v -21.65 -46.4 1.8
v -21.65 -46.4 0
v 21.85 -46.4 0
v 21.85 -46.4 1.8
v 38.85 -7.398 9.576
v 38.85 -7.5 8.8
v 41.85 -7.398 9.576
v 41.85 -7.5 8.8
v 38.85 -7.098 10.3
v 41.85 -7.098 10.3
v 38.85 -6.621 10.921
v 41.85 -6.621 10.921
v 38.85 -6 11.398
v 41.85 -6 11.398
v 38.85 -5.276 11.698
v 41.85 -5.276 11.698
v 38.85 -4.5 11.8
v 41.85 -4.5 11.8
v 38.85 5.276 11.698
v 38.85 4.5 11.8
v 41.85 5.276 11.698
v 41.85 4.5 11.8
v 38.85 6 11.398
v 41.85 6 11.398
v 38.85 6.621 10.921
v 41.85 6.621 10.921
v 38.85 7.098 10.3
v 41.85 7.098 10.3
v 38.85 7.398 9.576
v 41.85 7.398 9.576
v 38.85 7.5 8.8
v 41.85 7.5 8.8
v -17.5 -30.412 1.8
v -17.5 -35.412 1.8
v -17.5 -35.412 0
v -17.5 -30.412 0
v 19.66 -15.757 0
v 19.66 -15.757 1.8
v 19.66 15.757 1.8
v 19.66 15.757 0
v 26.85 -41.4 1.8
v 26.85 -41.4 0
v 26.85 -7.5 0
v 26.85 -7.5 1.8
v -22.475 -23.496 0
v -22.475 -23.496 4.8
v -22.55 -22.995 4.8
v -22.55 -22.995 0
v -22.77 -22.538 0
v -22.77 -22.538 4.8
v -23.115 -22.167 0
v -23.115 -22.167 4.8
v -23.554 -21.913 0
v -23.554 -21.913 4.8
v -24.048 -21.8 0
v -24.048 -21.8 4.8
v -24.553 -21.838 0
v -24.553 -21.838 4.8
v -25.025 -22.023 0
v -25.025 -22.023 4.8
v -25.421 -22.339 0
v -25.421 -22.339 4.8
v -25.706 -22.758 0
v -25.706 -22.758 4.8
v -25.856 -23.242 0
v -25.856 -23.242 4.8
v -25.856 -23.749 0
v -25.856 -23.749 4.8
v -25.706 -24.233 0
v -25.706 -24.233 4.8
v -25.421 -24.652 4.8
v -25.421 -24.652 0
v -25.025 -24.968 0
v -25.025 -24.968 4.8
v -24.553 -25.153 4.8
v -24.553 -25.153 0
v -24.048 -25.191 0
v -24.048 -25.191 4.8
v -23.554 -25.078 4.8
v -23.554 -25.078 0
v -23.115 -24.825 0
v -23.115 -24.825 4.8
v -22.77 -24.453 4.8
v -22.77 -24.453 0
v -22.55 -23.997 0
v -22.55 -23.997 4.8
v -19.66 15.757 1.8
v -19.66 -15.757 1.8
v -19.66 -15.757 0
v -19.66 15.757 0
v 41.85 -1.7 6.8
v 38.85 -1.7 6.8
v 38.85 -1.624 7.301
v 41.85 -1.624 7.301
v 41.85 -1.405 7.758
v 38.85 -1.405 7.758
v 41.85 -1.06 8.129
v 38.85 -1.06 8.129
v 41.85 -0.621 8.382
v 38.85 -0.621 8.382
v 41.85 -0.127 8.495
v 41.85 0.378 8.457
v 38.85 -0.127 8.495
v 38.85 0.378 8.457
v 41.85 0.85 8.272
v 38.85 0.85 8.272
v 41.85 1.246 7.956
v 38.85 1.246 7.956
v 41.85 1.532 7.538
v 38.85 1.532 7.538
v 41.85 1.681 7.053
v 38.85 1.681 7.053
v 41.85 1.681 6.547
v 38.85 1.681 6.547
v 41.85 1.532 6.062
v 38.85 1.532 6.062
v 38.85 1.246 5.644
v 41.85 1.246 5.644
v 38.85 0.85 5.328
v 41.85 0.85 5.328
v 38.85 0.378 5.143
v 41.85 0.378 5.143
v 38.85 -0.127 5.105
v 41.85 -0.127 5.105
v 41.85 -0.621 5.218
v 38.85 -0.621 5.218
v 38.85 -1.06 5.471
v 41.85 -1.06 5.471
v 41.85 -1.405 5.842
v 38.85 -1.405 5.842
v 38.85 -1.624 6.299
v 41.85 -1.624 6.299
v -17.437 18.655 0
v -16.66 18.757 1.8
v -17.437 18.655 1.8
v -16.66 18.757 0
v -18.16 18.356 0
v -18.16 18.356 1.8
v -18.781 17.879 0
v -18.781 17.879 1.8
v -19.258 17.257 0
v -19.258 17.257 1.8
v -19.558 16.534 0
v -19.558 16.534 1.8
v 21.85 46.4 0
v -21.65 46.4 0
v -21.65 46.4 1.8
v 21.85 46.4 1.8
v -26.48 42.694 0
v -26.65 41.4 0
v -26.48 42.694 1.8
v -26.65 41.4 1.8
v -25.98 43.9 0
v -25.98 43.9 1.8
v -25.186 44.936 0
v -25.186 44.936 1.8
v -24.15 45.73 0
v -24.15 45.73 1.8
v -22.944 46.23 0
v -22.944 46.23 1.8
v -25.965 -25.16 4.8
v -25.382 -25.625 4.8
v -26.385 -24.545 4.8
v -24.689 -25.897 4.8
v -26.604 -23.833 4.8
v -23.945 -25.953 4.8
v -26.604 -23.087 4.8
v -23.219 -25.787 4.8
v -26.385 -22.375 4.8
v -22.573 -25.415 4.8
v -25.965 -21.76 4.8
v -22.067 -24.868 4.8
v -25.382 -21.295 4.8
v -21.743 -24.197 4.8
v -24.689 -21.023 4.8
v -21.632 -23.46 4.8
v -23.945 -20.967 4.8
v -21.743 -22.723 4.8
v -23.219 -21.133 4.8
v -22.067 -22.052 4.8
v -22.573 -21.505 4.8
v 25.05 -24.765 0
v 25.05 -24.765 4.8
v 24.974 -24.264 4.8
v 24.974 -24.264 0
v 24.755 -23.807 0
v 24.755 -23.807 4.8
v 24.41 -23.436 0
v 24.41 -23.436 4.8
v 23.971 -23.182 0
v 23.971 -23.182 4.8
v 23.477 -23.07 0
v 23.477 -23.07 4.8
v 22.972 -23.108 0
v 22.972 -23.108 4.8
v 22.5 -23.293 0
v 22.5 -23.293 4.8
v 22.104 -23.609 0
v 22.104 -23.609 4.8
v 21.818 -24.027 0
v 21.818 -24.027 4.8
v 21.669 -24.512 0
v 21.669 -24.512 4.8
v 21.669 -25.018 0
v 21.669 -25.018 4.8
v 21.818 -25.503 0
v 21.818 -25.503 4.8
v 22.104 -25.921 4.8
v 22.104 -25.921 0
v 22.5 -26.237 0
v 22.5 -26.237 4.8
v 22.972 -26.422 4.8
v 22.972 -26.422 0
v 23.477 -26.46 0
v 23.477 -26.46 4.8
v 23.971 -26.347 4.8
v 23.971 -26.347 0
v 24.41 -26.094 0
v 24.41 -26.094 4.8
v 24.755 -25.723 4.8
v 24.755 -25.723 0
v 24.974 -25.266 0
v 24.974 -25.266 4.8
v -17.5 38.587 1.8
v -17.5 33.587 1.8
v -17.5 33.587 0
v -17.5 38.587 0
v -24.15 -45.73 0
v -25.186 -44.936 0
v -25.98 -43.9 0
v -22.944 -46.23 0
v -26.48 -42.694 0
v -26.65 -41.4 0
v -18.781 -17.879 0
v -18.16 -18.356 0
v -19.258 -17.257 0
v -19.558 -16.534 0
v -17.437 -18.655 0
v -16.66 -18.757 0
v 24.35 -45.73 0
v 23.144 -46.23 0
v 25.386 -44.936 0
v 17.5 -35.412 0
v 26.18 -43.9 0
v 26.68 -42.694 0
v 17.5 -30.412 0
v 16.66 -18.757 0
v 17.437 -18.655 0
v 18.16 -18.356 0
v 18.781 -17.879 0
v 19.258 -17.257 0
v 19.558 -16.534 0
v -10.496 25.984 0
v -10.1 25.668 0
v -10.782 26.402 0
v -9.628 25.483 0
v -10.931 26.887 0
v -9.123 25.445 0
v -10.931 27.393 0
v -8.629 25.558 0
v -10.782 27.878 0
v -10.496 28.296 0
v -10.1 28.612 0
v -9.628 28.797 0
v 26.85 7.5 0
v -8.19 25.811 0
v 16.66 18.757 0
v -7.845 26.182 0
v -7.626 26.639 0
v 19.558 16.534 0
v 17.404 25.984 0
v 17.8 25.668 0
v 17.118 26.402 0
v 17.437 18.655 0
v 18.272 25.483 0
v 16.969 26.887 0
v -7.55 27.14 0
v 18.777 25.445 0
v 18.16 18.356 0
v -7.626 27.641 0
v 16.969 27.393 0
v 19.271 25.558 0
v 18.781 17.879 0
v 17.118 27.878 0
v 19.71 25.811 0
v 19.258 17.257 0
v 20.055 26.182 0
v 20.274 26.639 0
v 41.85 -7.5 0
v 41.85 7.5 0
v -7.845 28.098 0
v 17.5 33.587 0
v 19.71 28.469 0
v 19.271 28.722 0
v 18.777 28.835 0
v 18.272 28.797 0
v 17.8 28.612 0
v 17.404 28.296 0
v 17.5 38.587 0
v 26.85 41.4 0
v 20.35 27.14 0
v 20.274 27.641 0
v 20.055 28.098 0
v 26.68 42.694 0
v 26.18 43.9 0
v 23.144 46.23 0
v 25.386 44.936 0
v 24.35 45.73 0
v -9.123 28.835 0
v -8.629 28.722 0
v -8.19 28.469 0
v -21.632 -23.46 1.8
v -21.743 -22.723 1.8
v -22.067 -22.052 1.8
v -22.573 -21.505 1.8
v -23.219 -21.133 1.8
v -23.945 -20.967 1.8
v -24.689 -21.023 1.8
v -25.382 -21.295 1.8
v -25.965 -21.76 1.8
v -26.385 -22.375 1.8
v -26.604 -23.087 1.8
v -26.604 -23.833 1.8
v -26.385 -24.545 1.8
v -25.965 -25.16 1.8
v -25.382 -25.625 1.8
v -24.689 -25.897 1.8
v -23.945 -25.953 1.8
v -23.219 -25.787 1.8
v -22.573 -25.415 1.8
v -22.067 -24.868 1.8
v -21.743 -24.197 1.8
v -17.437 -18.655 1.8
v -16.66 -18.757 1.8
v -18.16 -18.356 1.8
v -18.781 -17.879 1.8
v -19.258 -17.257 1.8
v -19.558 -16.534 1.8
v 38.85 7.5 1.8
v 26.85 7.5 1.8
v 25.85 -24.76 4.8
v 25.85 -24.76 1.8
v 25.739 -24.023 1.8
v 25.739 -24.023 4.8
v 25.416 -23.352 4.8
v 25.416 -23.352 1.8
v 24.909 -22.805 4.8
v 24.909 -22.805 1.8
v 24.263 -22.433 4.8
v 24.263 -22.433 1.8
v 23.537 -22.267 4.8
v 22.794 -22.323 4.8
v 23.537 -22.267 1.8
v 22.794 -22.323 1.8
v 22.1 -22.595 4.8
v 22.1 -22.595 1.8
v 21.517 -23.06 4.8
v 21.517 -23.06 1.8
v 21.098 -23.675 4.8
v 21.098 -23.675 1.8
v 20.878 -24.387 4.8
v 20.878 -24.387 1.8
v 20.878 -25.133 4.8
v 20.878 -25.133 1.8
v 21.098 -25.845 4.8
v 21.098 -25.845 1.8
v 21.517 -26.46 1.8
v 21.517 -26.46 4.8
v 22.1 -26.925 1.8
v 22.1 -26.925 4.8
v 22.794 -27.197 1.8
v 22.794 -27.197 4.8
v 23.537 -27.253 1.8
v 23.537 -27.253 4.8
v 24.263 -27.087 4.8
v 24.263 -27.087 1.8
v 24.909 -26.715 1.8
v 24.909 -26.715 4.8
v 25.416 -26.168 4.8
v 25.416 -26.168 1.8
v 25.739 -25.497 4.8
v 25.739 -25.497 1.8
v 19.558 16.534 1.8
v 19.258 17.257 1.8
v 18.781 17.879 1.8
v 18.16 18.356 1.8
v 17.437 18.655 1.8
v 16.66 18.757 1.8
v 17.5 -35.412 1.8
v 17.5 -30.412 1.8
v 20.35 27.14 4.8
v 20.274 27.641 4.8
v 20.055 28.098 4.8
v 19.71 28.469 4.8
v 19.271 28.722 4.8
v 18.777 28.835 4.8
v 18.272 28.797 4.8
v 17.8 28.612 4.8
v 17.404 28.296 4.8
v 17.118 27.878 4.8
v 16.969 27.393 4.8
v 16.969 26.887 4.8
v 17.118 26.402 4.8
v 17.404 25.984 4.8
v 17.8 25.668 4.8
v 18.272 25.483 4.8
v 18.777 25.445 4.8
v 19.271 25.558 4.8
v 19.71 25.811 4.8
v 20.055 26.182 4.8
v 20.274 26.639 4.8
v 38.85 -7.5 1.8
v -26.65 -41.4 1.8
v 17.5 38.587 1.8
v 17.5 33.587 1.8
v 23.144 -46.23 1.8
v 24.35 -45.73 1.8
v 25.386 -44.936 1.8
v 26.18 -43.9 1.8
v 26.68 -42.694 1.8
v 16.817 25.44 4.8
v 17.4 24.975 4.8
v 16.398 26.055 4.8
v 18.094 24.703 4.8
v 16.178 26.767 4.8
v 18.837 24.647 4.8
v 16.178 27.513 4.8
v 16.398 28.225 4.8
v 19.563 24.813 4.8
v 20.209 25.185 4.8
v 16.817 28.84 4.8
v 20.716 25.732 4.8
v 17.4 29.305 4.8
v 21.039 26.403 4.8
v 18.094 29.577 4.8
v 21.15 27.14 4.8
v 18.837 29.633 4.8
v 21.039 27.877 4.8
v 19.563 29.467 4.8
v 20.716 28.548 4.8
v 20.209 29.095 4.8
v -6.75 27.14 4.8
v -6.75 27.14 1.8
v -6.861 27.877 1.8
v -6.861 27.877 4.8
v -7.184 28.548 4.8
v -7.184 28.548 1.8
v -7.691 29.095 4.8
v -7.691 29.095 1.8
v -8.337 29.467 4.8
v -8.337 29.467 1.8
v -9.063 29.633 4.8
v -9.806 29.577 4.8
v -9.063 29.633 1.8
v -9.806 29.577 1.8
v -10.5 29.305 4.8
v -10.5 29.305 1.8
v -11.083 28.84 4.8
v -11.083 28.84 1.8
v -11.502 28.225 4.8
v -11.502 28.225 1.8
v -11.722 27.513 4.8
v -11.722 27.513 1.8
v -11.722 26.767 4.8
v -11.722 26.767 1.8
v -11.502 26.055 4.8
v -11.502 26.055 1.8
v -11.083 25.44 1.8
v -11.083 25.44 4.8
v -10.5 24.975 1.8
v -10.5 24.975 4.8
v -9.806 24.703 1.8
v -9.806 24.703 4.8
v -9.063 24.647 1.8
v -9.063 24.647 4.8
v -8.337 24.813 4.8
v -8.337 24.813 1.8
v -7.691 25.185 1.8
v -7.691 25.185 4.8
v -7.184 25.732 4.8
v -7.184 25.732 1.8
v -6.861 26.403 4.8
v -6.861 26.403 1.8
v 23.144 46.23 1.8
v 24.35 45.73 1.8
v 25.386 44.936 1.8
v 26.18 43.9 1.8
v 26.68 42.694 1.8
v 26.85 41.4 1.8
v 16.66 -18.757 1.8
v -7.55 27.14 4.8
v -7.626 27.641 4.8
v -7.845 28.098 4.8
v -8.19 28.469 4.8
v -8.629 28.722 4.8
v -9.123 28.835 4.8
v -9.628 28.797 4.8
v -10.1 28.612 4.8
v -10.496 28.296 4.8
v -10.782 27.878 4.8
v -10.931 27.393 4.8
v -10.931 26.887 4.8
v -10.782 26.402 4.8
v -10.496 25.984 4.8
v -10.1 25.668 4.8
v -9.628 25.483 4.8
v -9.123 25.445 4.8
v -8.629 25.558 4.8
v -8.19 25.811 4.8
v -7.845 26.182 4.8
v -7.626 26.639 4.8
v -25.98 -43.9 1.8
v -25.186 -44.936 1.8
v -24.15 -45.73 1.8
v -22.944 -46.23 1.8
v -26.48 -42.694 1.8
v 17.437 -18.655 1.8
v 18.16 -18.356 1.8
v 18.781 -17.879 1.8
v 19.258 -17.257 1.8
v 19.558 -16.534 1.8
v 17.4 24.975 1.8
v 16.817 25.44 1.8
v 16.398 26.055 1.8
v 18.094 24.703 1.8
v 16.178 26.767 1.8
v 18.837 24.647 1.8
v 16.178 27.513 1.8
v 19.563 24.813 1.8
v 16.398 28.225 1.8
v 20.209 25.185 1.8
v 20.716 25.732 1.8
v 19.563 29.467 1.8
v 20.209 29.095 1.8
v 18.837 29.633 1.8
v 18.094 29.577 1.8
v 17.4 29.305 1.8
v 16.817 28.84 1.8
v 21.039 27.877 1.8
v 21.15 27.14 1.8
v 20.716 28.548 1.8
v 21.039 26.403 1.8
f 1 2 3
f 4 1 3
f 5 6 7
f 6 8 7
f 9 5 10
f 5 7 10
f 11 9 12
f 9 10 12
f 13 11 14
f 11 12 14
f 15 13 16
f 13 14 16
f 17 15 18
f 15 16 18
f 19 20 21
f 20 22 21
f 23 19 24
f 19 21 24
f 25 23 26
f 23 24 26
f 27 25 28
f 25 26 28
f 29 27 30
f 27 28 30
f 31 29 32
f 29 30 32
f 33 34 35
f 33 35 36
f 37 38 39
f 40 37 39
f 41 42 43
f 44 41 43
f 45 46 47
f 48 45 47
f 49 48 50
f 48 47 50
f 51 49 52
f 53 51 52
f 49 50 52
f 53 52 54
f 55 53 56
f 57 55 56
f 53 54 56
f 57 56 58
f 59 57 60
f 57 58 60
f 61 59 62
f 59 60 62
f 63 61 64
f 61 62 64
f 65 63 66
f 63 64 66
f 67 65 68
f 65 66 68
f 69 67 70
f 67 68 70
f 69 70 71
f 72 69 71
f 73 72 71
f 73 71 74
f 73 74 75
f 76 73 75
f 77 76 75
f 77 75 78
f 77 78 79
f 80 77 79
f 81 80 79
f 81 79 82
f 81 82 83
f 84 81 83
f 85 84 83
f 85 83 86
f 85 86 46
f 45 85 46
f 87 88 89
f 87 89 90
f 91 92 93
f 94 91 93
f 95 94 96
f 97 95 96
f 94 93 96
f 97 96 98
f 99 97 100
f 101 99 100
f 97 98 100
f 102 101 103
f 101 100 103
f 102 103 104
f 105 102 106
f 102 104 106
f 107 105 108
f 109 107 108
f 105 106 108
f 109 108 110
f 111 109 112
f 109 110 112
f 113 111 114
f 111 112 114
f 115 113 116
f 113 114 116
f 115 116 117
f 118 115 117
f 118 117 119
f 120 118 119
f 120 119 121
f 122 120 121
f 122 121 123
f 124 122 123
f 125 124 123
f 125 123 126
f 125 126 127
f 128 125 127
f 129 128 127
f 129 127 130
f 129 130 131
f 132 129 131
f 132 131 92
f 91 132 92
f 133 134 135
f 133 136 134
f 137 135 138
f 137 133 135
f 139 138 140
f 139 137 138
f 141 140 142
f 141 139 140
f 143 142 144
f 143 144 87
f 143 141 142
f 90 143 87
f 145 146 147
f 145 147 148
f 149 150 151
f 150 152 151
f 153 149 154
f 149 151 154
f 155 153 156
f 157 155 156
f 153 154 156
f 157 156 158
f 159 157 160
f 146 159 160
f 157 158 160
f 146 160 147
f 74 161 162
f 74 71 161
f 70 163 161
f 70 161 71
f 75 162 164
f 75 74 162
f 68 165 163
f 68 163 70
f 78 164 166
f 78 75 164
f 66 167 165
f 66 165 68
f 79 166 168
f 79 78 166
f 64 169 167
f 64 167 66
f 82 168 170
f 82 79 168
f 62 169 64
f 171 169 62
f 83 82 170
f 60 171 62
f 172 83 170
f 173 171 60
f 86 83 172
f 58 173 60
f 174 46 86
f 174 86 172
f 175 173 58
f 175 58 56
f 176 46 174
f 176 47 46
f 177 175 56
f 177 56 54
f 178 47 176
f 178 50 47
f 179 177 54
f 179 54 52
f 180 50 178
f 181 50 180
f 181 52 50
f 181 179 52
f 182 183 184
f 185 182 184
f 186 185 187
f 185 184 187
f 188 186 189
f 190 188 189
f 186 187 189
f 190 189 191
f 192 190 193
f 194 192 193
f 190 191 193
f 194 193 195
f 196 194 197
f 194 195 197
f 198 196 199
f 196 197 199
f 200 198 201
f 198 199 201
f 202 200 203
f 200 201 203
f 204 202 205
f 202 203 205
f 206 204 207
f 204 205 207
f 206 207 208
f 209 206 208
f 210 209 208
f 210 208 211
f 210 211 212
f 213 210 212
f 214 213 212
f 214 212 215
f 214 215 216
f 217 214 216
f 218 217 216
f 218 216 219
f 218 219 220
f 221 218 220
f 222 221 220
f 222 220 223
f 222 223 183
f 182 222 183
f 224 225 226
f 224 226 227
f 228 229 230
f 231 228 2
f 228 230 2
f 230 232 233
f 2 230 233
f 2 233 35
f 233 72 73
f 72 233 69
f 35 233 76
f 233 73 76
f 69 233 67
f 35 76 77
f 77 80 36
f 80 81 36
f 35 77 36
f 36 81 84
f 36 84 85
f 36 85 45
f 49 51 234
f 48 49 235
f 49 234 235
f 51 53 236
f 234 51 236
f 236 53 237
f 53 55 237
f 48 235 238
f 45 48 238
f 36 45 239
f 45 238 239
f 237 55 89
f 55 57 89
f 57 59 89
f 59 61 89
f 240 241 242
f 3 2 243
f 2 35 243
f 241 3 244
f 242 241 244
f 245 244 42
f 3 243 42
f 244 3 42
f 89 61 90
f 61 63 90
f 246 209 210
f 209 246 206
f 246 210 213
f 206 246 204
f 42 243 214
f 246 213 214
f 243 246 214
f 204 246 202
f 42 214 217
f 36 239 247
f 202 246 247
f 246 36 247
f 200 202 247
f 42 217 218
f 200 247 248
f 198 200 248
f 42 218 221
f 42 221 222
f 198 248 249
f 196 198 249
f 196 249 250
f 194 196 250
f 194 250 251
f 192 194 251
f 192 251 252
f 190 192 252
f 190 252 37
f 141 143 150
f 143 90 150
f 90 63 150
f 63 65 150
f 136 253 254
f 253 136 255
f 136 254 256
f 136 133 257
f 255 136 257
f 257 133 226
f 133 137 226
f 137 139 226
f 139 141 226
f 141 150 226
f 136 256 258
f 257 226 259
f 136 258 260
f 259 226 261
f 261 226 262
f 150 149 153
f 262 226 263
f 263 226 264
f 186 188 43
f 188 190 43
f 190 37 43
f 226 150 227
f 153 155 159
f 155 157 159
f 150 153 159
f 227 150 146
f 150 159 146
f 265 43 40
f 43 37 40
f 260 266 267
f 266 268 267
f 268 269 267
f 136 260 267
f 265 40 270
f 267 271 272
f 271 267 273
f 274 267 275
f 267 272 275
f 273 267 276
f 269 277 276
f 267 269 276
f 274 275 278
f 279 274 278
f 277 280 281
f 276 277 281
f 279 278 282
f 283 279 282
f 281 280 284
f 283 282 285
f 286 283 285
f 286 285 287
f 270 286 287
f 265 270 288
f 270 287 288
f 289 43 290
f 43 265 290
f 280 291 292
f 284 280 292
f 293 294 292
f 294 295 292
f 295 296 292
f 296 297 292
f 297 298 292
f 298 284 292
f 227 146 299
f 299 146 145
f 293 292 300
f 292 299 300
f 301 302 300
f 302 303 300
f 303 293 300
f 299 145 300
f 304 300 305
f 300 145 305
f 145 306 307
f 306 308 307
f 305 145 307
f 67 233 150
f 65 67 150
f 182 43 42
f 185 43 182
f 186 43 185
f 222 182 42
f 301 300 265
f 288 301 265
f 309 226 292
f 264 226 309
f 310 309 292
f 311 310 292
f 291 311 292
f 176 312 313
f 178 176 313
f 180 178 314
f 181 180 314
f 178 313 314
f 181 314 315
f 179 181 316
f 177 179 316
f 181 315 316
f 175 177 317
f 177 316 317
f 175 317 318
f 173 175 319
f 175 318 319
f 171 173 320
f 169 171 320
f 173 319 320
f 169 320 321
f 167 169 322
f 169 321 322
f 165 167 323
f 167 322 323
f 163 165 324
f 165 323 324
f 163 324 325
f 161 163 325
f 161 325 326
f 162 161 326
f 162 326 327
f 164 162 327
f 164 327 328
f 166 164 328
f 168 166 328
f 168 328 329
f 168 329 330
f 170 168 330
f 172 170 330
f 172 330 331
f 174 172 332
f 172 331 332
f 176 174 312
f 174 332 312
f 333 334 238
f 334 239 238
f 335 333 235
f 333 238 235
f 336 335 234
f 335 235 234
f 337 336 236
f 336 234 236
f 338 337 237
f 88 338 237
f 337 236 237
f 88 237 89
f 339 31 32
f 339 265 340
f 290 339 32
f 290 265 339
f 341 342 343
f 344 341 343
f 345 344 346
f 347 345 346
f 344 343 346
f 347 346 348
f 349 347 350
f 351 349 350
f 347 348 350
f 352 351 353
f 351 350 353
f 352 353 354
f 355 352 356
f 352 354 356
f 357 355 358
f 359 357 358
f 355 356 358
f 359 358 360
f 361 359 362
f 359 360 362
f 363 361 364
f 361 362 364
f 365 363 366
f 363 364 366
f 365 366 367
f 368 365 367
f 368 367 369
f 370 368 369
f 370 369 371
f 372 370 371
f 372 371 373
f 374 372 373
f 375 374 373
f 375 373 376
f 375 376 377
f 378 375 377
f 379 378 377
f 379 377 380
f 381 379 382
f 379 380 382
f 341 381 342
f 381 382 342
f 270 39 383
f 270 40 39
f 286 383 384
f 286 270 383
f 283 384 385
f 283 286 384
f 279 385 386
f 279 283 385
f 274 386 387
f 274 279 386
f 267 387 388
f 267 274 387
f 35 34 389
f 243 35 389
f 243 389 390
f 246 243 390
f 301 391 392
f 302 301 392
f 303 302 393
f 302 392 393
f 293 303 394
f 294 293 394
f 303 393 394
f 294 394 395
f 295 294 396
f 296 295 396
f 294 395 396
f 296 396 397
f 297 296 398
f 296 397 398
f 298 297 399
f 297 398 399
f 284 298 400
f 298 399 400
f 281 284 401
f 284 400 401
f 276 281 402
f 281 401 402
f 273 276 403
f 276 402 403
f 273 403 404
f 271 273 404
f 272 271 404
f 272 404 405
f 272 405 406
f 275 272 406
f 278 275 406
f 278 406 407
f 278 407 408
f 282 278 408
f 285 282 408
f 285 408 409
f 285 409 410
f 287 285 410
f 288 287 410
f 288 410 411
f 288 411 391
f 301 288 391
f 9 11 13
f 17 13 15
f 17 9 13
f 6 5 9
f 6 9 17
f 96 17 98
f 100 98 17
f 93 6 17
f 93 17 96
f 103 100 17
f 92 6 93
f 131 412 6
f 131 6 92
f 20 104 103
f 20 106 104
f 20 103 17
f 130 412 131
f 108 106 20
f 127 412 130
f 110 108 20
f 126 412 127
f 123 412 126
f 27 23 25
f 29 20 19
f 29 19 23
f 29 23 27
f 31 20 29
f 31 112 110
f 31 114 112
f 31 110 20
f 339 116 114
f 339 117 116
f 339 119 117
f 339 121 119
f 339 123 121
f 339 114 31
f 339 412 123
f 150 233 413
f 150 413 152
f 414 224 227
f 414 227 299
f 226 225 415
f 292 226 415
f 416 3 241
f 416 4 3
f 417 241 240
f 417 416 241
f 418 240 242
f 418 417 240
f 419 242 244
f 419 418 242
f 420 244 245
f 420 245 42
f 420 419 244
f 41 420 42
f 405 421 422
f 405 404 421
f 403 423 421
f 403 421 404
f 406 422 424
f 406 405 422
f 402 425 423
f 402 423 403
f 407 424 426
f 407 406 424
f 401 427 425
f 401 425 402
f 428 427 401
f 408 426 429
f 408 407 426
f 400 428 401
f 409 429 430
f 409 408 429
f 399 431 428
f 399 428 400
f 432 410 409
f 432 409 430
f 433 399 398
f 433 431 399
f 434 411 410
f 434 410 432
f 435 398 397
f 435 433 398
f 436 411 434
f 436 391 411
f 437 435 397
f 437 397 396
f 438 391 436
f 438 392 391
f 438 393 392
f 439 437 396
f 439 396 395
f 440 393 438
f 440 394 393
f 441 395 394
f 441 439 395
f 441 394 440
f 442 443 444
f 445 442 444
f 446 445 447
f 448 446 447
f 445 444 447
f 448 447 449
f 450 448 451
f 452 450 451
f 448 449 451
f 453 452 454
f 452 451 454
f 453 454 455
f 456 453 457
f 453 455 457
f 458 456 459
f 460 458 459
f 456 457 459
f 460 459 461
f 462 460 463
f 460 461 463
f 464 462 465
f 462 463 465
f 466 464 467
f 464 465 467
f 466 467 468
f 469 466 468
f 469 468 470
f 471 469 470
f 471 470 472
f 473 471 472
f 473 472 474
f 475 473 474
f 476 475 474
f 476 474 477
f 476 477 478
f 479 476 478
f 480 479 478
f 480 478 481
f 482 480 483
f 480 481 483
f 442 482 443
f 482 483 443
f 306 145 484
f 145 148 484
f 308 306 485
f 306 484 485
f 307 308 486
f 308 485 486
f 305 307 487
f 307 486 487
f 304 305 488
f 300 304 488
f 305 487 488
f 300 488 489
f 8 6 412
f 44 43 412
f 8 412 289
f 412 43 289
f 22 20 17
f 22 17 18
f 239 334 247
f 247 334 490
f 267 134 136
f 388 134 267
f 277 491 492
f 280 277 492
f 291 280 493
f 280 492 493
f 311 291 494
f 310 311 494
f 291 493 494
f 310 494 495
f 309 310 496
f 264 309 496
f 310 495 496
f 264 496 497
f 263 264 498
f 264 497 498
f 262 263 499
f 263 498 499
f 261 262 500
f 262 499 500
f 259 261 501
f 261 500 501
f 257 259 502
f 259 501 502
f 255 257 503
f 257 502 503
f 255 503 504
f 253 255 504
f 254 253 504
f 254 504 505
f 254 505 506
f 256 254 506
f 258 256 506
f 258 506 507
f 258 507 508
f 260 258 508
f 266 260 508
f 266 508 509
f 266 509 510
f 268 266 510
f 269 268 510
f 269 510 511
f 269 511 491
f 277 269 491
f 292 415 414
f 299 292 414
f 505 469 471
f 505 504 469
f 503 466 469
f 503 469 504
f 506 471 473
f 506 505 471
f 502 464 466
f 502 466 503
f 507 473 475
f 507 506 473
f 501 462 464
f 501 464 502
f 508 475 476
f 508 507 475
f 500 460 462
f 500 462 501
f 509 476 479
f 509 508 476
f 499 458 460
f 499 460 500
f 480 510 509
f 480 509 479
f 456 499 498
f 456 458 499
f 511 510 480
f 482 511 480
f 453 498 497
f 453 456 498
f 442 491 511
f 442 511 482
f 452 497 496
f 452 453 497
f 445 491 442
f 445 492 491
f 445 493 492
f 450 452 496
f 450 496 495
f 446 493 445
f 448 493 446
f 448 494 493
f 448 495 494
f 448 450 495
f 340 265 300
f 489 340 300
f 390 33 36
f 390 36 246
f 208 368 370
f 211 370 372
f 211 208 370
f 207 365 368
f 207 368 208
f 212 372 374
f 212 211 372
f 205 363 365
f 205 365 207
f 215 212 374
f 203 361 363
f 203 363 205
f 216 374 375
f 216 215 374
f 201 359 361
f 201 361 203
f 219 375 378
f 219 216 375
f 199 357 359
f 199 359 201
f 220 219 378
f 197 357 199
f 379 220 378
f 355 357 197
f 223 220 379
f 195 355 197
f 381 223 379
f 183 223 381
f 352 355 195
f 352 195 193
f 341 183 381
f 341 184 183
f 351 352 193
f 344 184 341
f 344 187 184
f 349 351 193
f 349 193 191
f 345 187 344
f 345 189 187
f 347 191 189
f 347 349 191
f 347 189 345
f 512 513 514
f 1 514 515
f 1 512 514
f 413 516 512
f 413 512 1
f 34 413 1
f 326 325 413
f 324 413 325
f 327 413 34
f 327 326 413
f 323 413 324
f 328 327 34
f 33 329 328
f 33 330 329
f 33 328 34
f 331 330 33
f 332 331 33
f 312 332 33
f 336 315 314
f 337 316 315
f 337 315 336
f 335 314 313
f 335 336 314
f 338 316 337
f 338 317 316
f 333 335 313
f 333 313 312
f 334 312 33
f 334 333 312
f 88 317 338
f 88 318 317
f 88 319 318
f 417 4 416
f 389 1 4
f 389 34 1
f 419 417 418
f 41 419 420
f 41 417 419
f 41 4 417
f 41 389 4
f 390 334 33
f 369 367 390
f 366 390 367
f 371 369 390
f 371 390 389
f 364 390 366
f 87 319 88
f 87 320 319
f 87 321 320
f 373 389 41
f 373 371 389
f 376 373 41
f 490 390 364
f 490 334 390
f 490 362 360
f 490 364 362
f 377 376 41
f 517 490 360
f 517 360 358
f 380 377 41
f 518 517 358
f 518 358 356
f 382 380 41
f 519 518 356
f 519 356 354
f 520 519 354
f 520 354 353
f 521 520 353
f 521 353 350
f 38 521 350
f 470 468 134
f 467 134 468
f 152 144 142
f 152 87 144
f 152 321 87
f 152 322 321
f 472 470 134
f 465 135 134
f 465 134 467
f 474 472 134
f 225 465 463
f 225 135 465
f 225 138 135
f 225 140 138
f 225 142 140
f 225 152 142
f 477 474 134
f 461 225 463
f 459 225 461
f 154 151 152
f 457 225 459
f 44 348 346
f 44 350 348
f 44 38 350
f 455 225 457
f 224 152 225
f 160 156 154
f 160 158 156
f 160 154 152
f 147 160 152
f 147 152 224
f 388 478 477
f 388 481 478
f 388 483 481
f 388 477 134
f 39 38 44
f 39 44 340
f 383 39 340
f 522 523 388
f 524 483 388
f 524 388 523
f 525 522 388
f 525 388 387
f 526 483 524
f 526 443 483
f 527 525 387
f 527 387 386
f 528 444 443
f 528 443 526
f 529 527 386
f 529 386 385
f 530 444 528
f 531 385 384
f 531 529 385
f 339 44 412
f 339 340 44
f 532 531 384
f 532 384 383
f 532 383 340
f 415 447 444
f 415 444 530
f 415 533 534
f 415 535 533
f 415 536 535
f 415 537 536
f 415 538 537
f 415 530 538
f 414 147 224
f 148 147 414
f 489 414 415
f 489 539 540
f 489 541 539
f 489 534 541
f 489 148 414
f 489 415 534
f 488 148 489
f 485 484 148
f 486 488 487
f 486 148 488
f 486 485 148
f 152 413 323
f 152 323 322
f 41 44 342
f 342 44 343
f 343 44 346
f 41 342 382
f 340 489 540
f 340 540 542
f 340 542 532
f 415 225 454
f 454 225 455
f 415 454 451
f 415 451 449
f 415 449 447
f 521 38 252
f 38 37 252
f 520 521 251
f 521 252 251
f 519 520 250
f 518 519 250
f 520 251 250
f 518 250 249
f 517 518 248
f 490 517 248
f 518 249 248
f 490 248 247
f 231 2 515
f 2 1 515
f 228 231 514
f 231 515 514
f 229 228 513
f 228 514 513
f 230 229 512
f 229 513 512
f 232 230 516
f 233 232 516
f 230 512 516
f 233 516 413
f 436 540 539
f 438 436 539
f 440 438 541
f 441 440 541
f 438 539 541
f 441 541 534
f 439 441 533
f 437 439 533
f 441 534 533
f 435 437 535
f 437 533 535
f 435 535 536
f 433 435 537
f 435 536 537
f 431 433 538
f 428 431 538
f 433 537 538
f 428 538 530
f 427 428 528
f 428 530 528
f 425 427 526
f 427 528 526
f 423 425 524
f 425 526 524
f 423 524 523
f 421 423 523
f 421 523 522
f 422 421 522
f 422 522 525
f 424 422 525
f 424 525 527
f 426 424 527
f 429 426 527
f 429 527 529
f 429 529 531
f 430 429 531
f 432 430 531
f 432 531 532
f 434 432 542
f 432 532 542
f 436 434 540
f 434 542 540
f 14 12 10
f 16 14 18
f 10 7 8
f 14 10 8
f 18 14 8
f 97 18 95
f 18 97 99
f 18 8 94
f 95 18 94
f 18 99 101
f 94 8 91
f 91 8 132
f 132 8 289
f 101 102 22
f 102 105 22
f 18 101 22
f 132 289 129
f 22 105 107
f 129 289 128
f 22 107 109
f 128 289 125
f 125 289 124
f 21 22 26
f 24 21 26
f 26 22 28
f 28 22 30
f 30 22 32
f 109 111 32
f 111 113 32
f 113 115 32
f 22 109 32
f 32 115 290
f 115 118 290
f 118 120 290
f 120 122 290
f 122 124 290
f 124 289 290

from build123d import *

# Parameters (mm, degrees)
SKETCH_W        = 53.5
SKETCH_H        = 92.8
PAD_DEPTH       = 1.8
SKETCH001_R     = 2.5
PAD001_DEPTH    = 3
SKETCH002_R     = 1.7
POCKET_DEPTH    = 5
SKETCH003_W     = 15
SKETCH003_H     = 1.8
PAD002_DEPTH    = 15
SKETCH004_W     = 39.320262
SKETCH004_H     = 37.514924
POCKET001_DEPTH = 5
FILLET_R        = 5
FILLET001_R     = 5
SKETCH005_W     = 35
SKETCH005_H     = 5
POCKET002_DEPTH = 5
SKETCH006_W     = 3
SKETCH006_H     = 15
PAD003_DEPTH    = 10
SKETCH007_R     = 1.7
POCKET003_DEPTH = 5
FILLET002_R     = 5
FILLET003_R     = 5
FILLET004_R     = 3
FILLET005_R     = 3
FILLET006_R     = 3
FILLET007_R     = 3
FILLET008_R     = 3
FILLET009_R     = 3


with BuildPart() as part:
    # Sketch → Pad (new body)
    with BuildSketch(Plane.XY):
        with Locations((0.1, 0)):
            Rectangle(SKETCH_W, SKETCH_H)
    extrude(amount=PAD_DEPTH)

    # Sketch001 (on Face6 of Pad) → Pad001 (join)
    with BuildSketch(Plane.XY.offset(1.8)):
        with Locations((-9.25, 27.14)):
            Circle(SKETCH001_R)
        with Locations((18.65, 27.14)):
            Circle(SKETCH001_R)
        with Locations((-24.132207, -23.46)):
            Circle(SKETCH001_R)
        with Locations((23.35, -24.76)):
            Circle(SKETCH001_R)
    extrude(amount=PAD001_DEPTH)

    # Sketch002 (on Face12 of Pad001) → Pocket (cut)
    with BuildSketch(Plane.XY.offset(4.8)):
        with Locations((-24.174742, -23.495716)):
            Circle(SKETCH002_R)
        with Locations((-9.25, 27.14)):
            Circle(SKETCH002_R)
        with Locations((18.65, 27.14)):
            Circle(SKETCH002_R)
        with Locations((23.35, -24.764911)):
            Circle(SKETCH002_R)
    extrude(amount=-POCKET_DEPTH, mode=Mode.SUBTRACT)

    # Sketch003 (on Face3 of Pocket) → Pad002 (join)
    with BuildSketch(Plane.YZ.offset(26.85)):
        with Locations((0, 0.9)):
            Rectangle(SKETCH003_W, SKETCH003_H)
    extrude(amount=PAD002_DEPTH)

    # Sketch004 (on Face5 of Pad002) → Pocket001 (cut)
    with BuildSketch(Plane.XY.offset(1.8)):
        Rectangle(SKETCH004_W, SKETCH004_H)
    extrude(amount=-POCKET001_DEPTH, mode=Mode.SUBTRACT)

    # Fillet
    fillet_edges = [part.edges().sort_by_distance(p)[0] for p in [
        (-26.65, 46.4, 0.9),
    ]]
    fillet(fillet_edges, radius=FILLET_R)

    # Fillet001
    fillet001_edges = [part.edges().sort_by_distance(p)[0] for p in [
        (26.85, -46.4, 0.9),
    ]]
    fillet(fillet001_edges, radius=FILLET001_R)

    # Sketch005 → Pocket002 (cut)
    with BuildSketch(Plane.XY.offset(1.8)):
        with Locations((0, -32.91241)):
            Rectangle(SKETCH005_W, SKETCH005_H)
        with Locations((0, 36.086824)):
            Rectangle(SKETCH005_W, SKETCH005_H)
    extrude(amount=-POCKET002_DEPTH, mode=Mode.SUBTRACT)

    # Sketch006 (on Face18 of Pocket001) → Pad003 (join)
    with BuildSketch(Plane.XY.offset(1.8)):
        with Locations((40.35, 0)):
            Rectangle(SKETCH006_W, SKETCH006_H)
    extrude(amount=PAD003_DEPTH)

    # Sketch007 (on Face42 of Pad003) → Pocket003 (cut)
    with BuildSketch(Plane(origin=(38.85, 0, 0), x_dir=(0, -1, 0), z_dir=(-1, 0, 0))):
        with Locations((0, 6.8)):
            Circle(SKETCH007_R)
    extrude(amount=-POCKET003_DEPTH, mode=Mode.SUBTRACT)

    # Fillet002
    fillet002_edges = [part.edges().sort_by_distance(p)[0] for p in [
        (-26.65, -46.4, 0.9),
    ]]
    fillet(fillet002_edges, radius=FILLET002_R)

    # Fillet003
    fillet003_edges = [part.edges().sort_by_distance(p)[0] for p in [
        (26.85, 46.4, 0.9),
    ]]
    fillet(fillet003_edges, radius=FILLET003_R)

    # Fillet004
    fillet004_edges = [part.edges().sort_by_distance(p)[0] for p in [
        (40.35, -7.5, 11.8),
    ]]
    fillet(fillet004_edges, radius=FILLET004_R)

    # Fillet005
    fillet005_edges = [part.edges().sort_by_distance(p)[0] for p in [
        (40.35, 7.5, 11.8),
    ]]
    fillet(fillet005_edges, radius=FILLET005_R)

    # Fillet006
    fillet006_edges = [part.edges().sort_by_distance(p)[0] for p in [
        (19.660131, 18.757462, 0.9),
    ]]
    fillet(fillet006_edges, radius=FILLET006_R)

    # Fillet007
    fillet007_edges = [part.edges().sort_by_distance(p)[0] for p in [
        (-19.660131, 18.757462, 0.9),
    ]]
    fillet(fillet007_edges, radius=FILLET007_R)

    # Fillet008
    fillet008_edges = [part.edges().sort_by_distance(p)[0] for p in [
        (19.660131, -18.757462, 0.9),
    ]]
    fillet(fillet008_edges, radius=FILLET008_R)

    # Fillet009
    fillet009_edges = [part.edges().sort_by_distance(p)[0] for p in [
        (-19.660131, -18.757462, 0.9),
    ]]
    fillet(fillet009_edges, radius=FILLET009_R)


solid = part.part
